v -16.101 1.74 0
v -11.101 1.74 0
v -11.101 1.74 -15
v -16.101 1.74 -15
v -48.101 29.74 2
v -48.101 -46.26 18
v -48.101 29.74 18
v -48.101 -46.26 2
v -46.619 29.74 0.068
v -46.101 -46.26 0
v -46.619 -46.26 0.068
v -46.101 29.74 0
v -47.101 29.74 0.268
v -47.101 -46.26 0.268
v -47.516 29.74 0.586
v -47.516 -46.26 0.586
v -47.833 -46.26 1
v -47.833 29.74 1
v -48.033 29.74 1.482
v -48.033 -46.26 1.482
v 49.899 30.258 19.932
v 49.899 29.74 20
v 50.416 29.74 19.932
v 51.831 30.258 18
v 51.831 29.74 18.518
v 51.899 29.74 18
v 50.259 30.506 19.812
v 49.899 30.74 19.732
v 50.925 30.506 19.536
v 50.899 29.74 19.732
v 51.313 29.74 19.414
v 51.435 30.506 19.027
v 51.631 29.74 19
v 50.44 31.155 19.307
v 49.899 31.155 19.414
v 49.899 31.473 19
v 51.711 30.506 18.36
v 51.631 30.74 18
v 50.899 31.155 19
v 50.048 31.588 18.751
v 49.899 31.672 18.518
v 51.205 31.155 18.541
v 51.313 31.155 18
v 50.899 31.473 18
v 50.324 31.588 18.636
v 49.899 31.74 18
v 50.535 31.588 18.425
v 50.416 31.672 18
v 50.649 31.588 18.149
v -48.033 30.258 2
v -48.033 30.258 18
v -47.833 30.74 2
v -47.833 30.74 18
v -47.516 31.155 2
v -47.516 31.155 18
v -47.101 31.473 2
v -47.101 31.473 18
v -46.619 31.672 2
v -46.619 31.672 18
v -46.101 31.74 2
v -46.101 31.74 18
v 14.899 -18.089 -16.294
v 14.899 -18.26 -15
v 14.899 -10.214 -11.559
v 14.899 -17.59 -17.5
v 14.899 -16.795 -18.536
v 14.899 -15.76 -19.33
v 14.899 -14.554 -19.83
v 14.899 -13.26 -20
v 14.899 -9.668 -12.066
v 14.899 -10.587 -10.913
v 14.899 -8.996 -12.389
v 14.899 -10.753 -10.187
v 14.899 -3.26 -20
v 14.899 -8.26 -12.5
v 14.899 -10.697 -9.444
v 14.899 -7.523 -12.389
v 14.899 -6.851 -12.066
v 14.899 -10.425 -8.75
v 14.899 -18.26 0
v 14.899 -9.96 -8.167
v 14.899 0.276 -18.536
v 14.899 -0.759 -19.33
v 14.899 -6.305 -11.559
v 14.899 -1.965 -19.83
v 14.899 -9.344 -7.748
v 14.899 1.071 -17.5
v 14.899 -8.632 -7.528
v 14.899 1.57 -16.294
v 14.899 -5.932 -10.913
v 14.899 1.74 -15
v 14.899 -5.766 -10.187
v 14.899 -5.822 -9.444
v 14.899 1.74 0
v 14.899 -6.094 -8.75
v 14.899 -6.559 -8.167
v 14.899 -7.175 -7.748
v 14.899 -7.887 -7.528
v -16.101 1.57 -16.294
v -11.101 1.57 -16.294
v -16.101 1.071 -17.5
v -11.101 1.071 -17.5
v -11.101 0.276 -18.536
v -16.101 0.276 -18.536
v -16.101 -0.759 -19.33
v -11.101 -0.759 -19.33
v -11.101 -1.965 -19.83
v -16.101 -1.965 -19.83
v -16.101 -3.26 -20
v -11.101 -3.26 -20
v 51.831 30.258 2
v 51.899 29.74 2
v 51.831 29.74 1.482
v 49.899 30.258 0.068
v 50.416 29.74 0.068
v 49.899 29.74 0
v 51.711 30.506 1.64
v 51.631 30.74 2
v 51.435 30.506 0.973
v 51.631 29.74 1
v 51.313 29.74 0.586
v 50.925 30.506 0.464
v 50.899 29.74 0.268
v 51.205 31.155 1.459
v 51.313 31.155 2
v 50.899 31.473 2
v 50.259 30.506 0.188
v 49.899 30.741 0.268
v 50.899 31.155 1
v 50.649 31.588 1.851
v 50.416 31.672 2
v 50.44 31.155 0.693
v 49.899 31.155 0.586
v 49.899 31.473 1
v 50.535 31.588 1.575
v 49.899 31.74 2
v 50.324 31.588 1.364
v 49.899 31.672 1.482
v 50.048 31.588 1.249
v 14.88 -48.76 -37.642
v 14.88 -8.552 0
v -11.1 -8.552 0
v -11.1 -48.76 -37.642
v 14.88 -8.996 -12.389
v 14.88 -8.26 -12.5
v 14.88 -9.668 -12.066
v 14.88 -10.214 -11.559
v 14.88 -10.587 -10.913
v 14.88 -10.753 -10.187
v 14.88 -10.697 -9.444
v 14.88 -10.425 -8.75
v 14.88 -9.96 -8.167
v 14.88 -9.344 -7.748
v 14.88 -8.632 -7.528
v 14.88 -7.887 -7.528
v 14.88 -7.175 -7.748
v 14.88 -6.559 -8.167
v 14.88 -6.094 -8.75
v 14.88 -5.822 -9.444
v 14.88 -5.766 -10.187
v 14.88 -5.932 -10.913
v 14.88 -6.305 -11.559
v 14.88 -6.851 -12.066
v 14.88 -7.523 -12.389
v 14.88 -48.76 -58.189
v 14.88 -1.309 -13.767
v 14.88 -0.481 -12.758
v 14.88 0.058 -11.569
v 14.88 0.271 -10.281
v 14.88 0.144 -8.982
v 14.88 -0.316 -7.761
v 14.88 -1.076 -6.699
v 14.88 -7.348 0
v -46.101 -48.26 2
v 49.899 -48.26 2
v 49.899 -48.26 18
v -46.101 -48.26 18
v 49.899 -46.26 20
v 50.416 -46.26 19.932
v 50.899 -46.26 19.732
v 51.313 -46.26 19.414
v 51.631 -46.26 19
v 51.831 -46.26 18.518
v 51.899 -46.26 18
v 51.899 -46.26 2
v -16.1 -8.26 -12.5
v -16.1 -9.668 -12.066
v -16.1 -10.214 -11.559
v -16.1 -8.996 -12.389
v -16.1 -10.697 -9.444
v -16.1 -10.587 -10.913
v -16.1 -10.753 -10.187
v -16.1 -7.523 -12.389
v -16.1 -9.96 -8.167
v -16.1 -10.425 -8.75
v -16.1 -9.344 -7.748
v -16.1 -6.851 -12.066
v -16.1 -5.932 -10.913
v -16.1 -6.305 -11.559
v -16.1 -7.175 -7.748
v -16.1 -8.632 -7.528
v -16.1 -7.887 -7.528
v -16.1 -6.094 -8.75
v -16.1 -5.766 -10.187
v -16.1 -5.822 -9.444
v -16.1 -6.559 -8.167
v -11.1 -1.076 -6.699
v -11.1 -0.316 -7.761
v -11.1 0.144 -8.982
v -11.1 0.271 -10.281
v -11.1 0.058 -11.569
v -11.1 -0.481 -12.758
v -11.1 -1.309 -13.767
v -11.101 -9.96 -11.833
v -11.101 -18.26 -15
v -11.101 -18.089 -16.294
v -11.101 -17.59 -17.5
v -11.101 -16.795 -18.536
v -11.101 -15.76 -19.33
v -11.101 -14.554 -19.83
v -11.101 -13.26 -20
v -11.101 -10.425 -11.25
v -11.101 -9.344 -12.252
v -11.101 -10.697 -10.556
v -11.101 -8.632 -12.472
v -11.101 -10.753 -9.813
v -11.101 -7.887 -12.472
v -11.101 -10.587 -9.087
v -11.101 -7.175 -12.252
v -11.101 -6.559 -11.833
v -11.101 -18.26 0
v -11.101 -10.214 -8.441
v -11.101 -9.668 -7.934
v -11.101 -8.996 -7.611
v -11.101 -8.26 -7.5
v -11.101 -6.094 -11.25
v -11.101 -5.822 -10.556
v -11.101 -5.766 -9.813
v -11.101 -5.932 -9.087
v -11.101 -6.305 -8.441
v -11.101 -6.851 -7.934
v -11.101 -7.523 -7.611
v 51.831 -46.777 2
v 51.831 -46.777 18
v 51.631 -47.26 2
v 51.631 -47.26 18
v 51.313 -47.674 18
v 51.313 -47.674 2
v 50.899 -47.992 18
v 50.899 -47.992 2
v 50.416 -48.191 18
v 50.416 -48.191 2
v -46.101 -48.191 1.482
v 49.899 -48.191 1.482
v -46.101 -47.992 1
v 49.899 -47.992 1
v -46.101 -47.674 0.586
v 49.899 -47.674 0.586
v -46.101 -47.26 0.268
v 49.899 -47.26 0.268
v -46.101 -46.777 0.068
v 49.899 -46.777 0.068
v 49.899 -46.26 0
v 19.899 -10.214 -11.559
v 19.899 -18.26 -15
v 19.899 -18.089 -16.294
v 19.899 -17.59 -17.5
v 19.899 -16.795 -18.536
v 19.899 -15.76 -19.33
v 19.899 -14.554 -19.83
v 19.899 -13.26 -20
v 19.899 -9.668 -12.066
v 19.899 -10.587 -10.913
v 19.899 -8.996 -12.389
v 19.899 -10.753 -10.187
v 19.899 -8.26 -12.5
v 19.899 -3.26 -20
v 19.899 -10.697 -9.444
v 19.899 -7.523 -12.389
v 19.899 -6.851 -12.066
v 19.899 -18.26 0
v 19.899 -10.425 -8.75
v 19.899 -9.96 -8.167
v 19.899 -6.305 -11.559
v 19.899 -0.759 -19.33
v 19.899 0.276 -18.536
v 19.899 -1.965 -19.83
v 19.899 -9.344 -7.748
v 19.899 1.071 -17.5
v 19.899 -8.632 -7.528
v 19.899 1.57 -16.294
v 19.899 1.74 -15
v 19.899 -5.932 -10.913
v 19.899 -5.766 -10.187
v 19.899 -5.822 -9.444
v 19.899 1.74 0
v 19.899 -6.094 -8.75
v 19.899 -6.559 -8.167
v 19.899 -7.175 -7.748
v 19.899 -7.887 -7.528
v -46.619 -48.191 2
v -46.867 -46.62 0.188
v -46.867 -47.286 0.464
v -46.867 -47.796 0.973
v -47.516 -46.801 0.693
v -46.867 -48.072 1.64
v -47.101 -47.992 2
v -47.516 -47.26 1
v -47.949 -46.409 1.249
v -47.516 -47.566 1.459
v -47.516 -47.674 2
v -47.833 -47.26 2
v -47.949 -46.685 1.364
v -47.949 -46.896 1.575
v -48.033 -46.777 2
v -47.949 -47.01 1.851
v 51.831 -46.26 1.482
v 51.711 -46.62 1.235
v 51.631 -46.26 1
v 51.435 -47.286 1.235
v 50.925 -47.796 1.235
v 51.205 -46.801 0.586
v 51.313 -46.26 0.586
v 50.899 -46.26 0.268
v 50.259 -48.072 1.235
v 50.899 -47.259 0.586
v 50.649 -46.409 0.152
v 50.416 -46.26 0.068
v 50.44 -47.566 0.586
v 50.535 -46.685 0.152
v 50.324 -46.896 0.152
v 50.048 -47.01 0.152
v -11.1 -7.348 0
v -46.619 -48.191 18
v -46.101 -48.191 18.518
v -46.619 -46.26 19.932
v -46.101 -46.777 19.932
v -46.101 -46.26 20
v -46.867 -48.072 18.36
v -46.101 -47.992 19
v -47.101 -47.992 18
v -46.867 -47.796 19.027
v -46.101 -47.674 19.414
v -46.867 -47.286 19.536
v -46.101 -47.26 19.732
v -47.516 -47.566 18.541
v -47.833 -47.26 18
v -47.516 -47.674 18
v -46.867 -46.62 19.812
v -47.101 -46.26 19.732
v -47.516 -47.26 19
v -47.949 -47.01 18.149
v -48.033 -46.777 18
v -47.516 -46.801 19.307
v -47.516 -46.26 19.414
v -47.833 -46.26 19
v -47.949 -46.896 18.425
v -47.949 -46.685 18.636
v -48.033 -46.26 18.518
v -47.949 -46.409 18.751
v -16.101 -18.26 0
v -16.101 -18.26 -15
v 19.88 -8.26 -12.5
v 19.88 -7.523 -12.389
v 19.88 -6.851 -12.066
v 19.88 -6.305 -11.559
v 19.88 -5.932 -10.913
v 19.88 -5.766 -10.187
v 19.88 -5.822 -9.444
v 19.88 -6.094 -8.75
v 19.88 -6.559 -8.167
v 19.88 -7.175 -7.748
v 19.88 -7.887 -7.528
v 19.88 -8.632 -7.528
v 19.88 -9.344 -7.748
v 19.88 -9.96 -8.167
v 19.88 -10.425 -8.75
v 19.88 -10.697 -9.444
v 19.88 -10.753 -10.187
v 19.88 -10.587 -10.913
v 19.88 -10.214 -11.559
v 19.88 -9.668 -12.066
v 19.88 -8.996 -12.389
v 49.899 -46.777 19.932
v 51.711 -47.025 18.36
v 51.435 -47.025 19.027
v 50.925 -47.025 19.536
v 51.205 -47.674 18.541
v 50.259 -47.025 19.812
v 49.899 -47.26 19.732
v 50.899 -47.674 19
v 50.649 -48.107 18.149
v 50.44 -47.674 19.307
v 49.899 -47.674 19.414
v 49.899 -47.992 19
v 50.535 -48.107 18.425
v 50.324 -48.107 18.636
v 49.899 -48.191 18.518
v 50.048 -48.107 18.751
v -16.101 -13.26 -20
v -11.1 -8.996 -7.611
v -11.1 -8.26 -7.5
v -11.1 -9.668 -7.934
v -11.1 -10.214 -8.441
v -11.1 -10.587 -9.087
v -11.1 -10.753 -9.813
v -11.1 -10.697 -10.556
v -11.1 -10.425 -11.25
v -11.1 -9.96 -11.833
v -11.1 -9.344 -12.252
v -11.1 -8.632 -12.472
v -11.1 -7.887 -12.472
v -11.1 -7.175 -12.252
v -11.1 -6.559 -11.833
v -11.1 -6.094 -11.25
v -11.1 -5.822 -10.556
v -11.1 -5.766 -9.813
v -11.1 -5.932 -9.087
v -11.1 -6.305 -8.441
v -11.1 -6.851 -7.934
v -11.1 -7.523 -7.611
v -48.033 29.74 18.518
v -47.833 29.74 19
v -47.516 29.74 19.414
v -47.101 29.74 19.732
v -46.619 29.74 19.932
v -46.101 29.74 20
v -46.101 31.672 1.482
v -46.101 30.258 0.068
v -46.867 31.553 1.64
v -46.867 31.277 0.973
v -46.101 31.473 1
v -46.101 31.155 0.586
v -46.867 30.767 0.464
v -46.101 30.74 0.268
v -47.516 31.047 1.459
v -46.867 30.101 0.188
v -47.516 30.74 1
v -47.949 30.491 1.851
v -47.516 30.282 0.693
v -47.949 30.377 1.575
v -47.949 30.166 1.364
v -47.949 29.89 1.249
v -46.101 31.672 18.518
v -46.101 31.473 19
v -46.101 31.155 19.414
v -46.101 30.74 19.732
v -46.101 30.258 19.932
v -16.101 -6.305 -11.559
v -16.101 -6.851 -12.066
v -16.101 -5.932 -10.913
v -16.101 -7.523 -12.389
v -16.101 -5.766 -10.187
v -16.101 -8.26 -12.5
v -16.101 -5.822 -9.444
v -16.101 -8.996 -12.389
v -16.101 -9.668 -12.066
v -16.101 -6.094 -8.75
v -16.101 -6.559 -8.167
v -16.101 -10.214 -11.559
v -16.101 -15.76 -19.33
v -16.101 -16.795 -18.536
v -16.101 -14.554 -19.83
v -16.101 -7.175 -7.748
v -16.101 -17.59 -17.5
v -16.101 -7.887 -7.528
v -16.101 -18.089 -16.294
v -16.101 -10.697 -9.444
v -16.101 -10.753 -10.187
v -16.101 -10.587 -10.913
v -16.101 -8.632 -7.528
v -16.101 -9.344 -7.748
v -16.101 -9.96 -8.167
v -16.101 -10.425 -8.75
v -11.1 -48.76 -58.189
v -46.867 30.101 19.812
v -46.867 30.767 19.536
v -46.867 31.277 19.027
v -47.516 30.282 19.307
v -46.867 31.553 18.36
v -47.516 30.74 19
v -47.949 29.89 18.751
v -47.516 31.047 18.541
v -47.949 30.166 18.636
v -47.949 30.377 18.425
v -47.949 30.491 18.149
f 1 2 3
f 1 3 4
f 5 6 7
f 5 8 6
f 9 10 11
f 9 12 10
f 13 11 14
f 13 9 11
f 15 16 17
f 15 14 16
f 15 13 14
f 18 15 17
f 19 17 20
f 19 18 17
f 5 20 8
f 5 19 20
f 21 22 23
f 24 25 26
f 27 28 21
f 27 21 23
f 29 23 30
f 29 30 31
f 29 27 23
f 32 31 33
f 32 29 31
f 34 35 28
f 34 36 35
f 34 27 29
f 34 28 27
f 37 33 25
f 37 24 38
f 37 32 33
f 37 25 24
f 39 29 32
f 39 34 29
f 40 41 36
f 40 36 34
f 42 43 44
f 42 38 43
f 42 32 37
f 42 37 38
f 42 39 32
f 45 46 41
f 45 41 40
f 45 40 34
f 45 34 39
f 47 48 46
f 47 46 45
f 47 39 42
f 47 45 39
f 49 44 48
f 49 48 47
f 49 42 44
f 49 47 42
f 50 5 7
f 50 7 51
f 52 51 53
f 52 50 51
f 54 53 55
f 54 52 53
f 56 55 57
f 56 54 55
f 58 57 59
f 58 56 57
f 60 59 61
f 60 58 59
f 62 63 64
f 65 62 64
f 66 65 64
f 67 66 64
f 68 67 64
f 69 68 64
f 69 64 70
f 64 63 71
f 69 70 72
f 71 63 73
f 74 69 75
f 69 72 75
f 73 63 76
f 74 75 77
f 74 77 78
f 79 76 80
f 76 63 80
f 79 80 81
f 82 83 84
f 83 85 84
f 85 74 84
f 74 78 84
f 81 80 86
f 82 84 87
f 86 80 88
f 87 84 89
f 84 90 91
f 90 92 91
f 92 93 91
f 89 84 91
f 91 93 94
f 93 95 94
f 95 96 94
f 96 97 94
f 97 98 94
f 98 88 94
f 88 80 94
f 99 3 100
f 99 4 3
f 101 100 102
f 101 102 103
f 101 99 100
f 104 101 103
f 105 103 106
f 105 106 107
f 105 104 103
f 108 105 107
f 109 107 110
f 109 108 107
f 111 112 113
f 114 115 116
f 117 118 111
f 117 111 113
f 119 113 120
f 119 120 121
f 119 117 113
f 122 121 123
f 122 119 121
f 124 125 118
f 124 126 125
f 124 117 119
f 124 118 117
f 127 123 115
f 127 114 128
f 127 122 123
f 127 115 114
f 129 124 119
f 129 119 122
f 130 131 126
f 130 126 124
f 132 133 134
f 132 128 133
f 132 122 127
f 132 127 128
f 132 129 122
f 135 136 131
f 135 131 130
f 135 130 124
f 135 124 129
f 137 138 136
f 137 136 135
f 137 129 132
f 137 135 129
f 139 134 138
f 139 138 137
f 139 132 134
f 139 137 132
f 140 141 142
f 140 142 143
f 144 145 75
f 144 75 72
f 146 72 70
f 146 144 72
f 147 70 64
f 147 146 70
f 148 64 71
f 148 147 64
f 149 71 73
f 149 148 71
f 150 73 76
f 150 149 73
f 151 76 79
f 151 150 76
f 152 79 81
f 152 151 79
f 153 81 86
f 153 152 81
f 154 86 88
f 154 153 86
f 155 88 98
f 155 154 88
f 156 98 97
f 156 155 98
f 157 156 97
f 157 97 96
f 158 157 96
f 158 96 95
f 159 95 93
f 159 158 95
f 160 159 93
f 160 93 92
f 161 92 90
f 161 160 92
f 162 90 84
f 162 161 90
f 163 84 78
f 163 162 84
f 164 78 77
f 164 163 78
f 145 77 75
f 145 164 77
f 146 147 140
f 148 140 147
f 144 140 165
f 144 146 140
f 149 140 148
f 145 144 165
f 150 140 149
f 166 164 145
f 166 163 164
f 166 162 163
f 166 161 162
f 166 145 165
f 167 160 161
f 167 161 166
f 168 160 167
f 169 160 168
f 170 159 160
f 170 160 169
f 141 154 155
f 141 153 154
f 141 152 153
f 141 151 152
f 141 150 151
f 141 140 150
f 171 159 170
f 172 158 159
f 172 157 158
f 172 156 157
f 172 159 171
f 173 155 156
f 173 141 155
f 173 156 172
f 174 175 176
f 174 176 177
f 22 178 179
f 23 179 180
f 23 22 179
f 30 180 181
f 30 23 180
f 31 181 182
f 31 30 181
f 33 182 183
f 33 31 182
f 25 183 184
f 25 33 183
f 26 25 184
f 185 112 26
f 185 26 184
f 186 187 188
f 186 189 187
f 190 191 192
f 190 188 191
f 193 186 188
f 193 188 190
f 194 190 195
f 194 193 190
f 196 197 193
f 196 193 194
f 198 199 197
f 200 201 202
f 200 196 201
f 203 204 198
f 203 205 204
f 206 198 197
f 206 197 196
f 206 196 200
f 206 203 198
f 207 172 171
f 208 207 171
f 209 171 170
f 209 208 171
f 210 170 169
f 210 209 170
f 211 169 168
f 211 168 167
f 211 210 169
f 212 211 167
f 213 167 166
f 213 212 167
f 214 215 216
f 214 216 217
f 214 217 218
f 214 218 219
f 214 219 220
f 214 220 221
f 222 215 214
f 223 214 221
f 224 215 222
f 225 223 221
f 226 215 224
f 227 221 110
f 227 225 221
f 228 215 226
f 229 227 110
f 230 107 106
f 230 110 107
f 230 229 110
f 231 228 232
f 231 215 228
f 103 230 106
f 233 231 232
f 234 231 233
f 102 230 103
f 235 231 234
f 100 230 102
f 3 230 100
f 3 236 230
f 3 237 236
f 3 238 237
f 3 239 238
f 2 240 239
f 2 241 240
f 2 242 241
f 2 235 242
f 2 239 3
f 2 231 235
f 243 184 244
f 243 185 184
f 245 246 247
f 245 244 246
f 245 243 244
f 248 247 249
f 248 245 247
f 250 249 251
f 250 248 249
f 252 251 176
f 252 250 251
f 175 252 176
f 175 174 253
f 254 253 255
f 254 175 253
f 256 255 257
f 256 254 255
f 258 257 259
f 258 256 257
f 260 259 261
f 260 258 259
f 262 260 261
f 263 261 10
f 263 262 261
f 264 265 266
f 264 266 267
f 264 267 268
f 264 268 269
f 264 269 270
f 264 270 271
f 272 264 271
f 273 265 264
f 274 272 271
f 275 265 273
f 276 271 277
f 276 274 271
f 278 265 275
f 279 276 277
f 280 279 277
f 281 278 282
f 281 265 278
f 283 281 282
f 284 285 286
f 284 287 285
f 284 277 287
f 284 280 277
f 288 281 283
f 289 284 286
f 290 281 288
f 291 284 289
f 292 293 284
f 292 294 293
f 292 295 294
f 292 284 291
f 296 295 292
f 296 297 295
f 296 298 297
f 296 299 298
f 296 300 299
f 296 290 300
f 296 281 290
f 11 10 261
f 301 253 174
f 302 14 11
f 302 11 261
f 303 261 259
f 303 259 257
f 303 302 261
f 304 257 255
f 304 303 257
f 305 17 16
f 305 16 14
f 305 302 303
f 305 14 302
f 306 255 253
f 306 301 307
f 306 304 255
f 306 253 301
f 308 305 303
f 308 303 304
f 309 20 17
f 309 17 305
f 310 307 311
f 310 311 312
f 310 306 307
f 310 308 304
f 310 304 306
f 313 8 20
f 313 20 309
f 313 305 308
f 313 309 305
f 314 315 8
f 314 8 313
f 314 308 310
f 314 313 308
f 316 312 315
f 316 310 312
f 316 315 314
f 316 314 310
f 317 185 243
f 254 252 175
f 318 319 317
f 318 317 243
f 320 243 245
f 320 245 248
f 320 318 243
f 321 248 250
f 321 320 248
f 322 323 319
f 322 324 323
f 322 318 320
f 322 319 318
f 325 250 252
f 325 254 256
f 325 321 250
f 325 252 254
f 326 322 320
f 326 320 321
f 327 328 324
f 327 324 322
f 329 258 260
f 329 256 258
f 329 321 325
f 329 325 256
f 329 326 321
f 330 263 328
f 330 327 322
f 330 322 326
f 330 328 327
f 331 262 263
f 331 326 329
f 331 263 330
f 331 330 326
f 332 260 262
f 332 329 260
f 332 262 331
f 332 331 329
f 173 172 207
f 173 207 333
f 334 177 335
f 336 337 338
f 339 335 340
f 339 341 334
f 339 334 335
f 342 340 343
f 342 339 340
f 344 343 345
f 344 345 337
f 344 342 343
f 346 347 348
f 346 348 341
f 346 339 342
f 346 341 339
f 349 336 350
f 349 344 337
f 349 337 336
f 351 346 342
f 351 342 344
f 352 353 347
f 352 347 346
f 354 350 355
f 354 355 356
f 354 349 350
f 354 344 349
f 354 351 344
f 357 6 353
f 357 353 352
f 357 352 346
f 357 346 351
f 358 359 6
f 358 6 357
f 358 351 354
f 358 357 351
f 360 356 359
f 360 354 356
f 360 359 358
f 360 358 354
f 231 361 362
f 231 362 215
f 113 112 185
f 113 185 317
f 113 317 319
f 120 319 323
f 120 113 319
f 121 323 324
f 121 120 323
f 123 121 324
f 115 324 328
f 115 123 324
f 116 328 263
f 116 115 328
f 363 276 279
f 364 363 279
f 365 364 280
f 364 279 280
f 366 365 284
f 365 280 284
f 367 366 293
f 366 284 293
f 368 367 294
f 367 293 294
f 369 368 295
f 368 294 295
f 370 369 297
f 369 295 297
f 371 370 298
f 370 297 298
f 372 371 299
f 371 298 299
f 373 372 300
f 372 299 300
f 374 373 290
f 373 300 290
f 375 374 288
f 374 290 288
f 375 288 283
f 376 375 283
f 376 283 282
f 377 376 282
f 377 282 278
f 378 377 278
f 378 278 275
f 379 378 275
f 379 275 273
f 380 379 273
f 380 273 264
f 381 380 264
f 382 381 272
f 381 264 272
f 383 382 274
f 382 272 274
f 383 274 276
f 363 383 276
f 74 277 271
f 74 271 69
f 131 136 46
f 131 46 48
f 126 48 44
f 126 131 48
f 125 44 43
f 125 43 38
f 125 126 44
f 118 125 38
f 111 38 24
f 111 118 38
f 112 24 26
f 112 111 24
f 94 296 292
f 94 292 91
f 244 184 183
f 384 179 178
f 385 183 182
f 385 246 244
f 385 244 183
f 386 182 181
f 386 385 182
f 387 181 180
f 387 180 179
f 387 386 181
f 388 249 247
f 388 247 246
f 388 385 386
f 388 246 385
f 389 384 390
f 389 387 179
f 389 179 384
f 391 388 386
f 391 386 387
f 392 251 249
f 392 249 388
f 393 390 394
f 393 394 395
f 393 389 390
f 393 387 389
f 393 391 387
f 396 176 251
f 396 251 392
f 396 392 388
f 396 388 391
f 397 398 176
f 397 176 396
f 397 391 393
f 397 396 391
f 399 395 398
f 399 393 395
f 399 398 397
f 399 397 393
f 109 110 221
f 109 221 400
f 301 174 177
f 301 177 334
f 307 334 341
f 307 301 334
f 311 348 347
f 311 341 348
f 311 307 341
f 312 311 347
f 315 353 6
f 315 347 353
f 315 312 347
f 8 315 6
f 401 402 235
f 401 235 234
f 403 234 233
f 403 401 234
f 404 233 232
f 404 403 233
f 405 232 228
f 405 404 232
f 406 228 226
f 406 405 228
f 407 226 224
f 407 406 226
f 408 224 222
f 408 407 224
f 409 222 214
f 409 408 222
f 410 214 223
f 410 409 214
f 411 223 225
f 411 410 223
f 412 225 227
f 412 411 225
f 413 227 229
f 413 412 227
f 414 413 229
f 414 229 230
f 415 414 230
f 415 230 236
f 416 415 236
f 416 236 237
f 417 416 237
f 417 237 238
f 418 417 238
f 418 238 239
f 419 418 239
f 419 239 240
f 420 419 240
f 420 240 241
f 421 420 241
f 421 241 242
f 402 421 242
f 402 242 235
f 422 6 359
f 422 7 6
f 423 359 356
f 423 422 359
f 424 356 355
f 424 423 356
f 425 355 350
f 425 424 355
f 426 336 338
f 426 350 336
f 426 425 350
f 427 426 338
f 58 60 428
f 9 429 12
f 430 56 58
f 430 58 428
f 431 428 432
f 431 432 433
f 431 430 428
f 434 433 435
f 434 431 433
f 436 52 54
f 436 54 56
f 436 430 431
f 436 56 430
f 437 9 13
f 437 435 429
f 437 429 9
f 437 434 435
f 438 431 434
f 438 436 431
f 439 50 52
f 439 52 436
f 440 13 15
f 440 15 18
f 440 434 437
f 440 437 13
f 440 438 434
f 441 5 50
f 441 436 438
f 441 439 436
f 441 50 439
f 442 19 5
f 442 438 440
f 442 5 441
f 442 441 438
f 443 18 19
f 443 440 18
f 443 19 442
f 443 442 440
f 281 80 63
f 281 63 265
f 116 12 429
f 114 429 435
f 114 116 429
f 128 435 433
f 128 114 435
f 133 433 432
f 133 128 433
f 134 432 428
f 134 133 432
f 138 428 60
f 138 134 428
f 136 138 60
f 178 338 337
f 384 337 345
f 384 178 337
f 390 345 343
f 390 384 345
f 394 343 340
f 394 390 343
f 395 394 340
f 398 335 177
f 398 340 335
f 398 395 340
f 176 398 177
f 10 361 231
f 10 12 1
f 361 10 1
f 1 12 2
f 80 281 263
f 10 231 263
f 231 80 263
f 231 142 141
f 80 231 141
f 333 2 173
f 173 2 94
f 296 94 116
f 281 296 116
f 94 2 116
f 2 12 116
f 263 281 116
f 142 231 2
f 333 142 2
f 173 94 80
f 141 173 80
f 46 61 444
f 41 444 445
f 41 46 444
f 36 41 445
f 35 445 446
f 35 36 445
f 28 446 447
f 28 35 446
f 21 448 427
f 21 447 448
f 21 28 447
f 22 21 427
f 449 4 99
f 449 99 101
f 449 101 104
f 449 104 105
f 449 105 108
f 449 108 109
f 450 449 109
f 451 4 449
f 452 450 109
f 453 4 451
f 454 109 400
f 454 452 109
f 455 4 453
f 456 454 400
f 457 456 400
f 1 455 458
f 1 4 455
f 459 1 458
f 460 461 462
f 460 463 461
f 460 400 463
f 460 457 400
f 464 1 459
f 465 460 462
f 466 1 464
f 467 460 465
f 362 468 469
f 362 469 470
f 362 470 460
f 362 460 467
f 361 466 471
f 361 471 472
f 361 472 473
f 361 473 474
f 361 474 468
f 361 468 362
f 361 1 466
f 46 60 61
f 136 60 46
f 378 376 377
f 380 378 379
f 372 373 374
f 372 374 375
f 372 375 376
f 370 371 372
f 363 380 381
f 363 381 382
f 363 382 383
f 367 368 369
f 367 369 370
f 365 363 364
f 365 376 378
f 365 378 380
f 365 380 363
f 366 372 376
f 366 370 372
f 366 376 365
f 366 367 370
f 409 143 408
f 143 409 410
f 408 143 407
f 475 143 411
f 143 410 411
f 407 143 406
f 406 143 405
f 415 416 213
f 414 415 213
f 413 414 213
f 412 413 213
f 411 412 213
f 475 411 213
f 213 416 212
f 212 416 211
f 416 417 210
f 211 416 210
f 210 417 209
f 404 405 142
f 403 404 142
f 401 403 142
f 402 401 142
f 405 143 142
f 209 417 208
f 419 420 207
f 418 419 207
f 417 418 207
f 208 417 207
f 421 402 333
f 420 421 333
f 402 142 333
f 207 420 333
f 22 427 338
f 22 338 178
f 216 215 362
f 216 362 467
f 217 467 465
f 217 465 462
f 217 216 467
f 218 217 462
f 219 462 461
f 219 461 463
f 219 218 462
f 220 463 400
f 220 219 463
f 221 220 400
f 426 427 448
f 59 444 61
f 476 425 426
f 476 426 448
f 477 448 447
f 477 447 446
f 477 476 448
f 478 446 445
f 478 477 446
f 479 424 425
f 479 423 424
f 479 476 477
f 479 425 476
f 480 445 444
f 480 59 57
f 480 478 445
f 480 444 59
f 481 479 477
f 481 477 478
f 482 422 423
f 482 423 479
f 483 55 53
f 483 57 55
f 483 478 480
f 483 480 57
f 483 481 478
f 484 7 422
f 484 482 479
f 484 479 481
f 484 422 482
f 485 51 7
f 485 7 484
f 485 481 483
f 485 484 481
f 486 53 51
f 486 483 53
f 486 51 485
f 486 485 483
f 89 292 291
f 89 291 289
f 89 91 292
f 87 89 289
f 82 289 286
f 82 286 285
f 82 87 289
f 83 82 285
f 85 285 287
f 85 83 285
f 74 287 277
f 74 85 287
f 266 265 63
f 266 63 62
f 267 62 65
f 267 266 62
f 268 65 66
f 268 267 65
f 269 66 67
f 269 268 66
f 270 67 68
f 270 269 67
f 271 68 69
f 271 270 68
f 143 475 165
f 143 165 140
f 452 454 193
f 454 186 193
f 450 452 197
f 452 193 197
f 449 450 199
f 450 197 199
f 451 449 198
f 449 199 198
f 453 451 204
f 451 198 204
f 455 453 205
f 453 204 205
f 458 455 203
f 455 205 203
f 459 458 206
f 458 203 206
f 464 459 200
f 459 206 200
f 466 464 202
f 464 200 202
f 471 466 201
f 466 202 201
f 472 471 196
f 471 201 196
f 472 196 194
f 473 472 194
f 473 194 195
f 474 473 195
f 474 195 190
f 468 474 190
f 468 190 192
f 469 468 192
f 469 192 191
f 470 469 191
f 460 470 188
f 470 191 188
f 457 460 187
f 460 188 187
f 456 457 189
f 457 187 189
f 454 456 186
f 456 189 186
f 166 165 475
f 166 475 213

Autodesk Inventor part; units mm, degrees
ref_plane "XZ Plane" through (0, 0, 0) normal (0, 1, 0) x (-1, 0, 0)
ref_plane "XY Plane" through (0, 0, 0) normal (0, 0, 1) x (1, 0, 0)
sketch "Skizze1" plane through (0, 0, 0) normal (0, 0, 1) x (1, 0, 0)
  line L0 (-68.1013, 0) -> (71.8987, 0) projected
  line L1 (0, -64.8603) -> (0, 47.8406) projected
  line L2 (-48.1013, 31.7405) -> (51.8987, 31.7405)
  line L3 (51.8987, 31.7405) -> (51.8987, -48.2595)
  line L4 (51.8987, -48.2595) -> (-48.1013, -48.2595)
  line L5 (-48.1013, -48.2595) -> (-48.1013, 31.7405)
  point P0 (0, 0)
  dimension "d0" = 100
  dimension "d1" = 80
extrude "Extrusion1" add sketch "Skizze1" along normal blind 20
fillet "Rundung1" radius 2 4 edges at (1.8987, 31.7405, 20) (-48.1013, -8.2595, 20) (51.8987, -8.2595, 20) (1.8987, -48.2595, 20)
fillet "Rundung2" radius 2 12 edges at (51.8987, -8.2595, 0) (1.8987, 31.7405, 0) (1.8987, -48.2595, 0) (-48.1013, -8.2595, 0) (51.3129, 31.1547, 19.4142) (51.8987, 31.7405, 9) (-47.5155, 31.1547, 19.4142) (-48.1013, 31.7405, 9) (51.3129, -47.6737, 19.4142) (51.8987, -48.2595, 9) (-47.5155, -47.6737, 19.4142) (-48.1013, -48.2595, 9)
sketch "Skizze2" plane through (0, 0, 0) normal (0, 0, -1) x (-1, 0, 0)
  line L0 (16.1013, 1.7405) -> (16.1013, -18.2595)
  line L1 (-19.8987, -18.2595) -> (-19.8987, 1.7405)
  line L2 (-49.8987, 29.7405) -> (46.1013, 29.7405) projected
  line L3 (-49.8987, -46.2595) -> (-49.8987, 29.7405) projected
  line L4 (46.1013, 29.7405) -> (46.1013, -46.2595) projected
  line L5 (-14.8987, -18.2595) -> (-14.8987, 1.7405)
  line L6 (11.1013, -18.2595) -> (11.1013, 1.7405)
  line L7 (-19.8987, 1.7405) -> (-14.8987, 1.7405)
  line L8 (11.1013, 1.7405) -> (16.1013, 1.7405)
  line L9 (16.1013, -18.2595) -> (11.1013, -18.2595)
  line L10 (-14.8987, -18.2595) -> (-19.8987, -18.2595)
  point P0 (0, 0)
  dimension "d8" = 30
  dimension "d9" = 30
  dimension "d10" = 5
  dimension "d11" = 5
  dimension "d12" = 20
  dimension "d13" = 20
extrude "Extrusion2" add sketch "Skizze2" along normal blind 20
fillet "Rundung3" radius 5 4 edges at (17.3987, 1.7405, -20) (17.3987, -18.2595, -20) (-13.6013, 1.7405, -20) (-13.6013, -18.2595, -20)
sketch "Skizze3" plane through (0, 0, 20) normal (0, 0, 1) x (1, 0, 0)
  point P0 (0, 0)
sketch "Skizze4" plane through (19.8987, -18.2595, 0) normal (1, 0, 0) x (0, 0, -1)
  line L0 (0, 0) -> (15, 0) projected
  line L1 (20, 15) -> (20, 5) projected
  circle A0 centre (10, 10) radius 2.5
  point P0 (0, 18.2595)
  dimension "d17" = 10
  dimension "d18" = 10
  dimension "d19" = 5
extrude "Extrusion3" cut sketch "Skizze4" against normal blind 40
sketch "Skizze5" plane through (19.8987, -18.2595, 0) normal (1, 0, 0) x (0, 0, -1)
  point P0 (0, 18.2595)
ref_plane "Arbeitsebene1" through (14.88, 0, 0) normal (1, 0, 0) x (0, 1, 0)
sketch "Skizze6" plane through (14.88, 0, 0) normal (1, 0, 0) x (0, 1, 0)
  line L0 (-7.91, 0.6008) -> (-48.7601, -37.6418)
  line L1 (-48.7601, -58.1892) -> (2.3413, -10.3495)
  line L2 (2.3413, -10.3495) -> (-7.91, 0.6008)
  circle A0 centre (-8.2595, -10) radius 2.5 projected
  line L3 (-48.7601, -58.1892) -> (-48.7601, -37.6418)
  point P0 (0, 0)
  dimension "d23" = 7.5
  dimension "d24" = 7.5
  dimension "d25" = 15
  dimension "d26" = 70
  dimension "d27" = 46.888
extrude "Extrusion4" add sketch "Skizze6" against normal blind 25.98 contours L2 L1 L3 L0 | A0
fillet "Rundung4" radius 5 1 edges at (1.89, 2.3413, -10.3495)
sketch "Skizze7" plane through (-11.1, 0, 0) normal (-1, 0, 0) x (0, 0, 1)
  circle A0 centre (-10, -8.2595) radius 2.5 projected
  circle A1 centre (-10, -8.2595) radius 2.5
  point P0 (0, 0)
  point P1 (-10.0246, -8.2595)
  dimension "d31" = 0
extrude "Extrusion5" add sketch "Skizze7" along normal blind 5
sketch "Skizze8" plane through (14.88, 0, 0) normal (1, 0, 0) x (0, 0, -1)
  circle A0 centre (10, -8.2595) radius 2.5 projected
  circle A1 centre (10, -8.2595) radius 2.5
  point P0 (0, 0)
  point P1 (9.9522, -8.2595)
  dimension "d34" = 0
extrude "Extrusion6" add sketch "Skizze8" along normal blind 5
properties part number "Lampe"
